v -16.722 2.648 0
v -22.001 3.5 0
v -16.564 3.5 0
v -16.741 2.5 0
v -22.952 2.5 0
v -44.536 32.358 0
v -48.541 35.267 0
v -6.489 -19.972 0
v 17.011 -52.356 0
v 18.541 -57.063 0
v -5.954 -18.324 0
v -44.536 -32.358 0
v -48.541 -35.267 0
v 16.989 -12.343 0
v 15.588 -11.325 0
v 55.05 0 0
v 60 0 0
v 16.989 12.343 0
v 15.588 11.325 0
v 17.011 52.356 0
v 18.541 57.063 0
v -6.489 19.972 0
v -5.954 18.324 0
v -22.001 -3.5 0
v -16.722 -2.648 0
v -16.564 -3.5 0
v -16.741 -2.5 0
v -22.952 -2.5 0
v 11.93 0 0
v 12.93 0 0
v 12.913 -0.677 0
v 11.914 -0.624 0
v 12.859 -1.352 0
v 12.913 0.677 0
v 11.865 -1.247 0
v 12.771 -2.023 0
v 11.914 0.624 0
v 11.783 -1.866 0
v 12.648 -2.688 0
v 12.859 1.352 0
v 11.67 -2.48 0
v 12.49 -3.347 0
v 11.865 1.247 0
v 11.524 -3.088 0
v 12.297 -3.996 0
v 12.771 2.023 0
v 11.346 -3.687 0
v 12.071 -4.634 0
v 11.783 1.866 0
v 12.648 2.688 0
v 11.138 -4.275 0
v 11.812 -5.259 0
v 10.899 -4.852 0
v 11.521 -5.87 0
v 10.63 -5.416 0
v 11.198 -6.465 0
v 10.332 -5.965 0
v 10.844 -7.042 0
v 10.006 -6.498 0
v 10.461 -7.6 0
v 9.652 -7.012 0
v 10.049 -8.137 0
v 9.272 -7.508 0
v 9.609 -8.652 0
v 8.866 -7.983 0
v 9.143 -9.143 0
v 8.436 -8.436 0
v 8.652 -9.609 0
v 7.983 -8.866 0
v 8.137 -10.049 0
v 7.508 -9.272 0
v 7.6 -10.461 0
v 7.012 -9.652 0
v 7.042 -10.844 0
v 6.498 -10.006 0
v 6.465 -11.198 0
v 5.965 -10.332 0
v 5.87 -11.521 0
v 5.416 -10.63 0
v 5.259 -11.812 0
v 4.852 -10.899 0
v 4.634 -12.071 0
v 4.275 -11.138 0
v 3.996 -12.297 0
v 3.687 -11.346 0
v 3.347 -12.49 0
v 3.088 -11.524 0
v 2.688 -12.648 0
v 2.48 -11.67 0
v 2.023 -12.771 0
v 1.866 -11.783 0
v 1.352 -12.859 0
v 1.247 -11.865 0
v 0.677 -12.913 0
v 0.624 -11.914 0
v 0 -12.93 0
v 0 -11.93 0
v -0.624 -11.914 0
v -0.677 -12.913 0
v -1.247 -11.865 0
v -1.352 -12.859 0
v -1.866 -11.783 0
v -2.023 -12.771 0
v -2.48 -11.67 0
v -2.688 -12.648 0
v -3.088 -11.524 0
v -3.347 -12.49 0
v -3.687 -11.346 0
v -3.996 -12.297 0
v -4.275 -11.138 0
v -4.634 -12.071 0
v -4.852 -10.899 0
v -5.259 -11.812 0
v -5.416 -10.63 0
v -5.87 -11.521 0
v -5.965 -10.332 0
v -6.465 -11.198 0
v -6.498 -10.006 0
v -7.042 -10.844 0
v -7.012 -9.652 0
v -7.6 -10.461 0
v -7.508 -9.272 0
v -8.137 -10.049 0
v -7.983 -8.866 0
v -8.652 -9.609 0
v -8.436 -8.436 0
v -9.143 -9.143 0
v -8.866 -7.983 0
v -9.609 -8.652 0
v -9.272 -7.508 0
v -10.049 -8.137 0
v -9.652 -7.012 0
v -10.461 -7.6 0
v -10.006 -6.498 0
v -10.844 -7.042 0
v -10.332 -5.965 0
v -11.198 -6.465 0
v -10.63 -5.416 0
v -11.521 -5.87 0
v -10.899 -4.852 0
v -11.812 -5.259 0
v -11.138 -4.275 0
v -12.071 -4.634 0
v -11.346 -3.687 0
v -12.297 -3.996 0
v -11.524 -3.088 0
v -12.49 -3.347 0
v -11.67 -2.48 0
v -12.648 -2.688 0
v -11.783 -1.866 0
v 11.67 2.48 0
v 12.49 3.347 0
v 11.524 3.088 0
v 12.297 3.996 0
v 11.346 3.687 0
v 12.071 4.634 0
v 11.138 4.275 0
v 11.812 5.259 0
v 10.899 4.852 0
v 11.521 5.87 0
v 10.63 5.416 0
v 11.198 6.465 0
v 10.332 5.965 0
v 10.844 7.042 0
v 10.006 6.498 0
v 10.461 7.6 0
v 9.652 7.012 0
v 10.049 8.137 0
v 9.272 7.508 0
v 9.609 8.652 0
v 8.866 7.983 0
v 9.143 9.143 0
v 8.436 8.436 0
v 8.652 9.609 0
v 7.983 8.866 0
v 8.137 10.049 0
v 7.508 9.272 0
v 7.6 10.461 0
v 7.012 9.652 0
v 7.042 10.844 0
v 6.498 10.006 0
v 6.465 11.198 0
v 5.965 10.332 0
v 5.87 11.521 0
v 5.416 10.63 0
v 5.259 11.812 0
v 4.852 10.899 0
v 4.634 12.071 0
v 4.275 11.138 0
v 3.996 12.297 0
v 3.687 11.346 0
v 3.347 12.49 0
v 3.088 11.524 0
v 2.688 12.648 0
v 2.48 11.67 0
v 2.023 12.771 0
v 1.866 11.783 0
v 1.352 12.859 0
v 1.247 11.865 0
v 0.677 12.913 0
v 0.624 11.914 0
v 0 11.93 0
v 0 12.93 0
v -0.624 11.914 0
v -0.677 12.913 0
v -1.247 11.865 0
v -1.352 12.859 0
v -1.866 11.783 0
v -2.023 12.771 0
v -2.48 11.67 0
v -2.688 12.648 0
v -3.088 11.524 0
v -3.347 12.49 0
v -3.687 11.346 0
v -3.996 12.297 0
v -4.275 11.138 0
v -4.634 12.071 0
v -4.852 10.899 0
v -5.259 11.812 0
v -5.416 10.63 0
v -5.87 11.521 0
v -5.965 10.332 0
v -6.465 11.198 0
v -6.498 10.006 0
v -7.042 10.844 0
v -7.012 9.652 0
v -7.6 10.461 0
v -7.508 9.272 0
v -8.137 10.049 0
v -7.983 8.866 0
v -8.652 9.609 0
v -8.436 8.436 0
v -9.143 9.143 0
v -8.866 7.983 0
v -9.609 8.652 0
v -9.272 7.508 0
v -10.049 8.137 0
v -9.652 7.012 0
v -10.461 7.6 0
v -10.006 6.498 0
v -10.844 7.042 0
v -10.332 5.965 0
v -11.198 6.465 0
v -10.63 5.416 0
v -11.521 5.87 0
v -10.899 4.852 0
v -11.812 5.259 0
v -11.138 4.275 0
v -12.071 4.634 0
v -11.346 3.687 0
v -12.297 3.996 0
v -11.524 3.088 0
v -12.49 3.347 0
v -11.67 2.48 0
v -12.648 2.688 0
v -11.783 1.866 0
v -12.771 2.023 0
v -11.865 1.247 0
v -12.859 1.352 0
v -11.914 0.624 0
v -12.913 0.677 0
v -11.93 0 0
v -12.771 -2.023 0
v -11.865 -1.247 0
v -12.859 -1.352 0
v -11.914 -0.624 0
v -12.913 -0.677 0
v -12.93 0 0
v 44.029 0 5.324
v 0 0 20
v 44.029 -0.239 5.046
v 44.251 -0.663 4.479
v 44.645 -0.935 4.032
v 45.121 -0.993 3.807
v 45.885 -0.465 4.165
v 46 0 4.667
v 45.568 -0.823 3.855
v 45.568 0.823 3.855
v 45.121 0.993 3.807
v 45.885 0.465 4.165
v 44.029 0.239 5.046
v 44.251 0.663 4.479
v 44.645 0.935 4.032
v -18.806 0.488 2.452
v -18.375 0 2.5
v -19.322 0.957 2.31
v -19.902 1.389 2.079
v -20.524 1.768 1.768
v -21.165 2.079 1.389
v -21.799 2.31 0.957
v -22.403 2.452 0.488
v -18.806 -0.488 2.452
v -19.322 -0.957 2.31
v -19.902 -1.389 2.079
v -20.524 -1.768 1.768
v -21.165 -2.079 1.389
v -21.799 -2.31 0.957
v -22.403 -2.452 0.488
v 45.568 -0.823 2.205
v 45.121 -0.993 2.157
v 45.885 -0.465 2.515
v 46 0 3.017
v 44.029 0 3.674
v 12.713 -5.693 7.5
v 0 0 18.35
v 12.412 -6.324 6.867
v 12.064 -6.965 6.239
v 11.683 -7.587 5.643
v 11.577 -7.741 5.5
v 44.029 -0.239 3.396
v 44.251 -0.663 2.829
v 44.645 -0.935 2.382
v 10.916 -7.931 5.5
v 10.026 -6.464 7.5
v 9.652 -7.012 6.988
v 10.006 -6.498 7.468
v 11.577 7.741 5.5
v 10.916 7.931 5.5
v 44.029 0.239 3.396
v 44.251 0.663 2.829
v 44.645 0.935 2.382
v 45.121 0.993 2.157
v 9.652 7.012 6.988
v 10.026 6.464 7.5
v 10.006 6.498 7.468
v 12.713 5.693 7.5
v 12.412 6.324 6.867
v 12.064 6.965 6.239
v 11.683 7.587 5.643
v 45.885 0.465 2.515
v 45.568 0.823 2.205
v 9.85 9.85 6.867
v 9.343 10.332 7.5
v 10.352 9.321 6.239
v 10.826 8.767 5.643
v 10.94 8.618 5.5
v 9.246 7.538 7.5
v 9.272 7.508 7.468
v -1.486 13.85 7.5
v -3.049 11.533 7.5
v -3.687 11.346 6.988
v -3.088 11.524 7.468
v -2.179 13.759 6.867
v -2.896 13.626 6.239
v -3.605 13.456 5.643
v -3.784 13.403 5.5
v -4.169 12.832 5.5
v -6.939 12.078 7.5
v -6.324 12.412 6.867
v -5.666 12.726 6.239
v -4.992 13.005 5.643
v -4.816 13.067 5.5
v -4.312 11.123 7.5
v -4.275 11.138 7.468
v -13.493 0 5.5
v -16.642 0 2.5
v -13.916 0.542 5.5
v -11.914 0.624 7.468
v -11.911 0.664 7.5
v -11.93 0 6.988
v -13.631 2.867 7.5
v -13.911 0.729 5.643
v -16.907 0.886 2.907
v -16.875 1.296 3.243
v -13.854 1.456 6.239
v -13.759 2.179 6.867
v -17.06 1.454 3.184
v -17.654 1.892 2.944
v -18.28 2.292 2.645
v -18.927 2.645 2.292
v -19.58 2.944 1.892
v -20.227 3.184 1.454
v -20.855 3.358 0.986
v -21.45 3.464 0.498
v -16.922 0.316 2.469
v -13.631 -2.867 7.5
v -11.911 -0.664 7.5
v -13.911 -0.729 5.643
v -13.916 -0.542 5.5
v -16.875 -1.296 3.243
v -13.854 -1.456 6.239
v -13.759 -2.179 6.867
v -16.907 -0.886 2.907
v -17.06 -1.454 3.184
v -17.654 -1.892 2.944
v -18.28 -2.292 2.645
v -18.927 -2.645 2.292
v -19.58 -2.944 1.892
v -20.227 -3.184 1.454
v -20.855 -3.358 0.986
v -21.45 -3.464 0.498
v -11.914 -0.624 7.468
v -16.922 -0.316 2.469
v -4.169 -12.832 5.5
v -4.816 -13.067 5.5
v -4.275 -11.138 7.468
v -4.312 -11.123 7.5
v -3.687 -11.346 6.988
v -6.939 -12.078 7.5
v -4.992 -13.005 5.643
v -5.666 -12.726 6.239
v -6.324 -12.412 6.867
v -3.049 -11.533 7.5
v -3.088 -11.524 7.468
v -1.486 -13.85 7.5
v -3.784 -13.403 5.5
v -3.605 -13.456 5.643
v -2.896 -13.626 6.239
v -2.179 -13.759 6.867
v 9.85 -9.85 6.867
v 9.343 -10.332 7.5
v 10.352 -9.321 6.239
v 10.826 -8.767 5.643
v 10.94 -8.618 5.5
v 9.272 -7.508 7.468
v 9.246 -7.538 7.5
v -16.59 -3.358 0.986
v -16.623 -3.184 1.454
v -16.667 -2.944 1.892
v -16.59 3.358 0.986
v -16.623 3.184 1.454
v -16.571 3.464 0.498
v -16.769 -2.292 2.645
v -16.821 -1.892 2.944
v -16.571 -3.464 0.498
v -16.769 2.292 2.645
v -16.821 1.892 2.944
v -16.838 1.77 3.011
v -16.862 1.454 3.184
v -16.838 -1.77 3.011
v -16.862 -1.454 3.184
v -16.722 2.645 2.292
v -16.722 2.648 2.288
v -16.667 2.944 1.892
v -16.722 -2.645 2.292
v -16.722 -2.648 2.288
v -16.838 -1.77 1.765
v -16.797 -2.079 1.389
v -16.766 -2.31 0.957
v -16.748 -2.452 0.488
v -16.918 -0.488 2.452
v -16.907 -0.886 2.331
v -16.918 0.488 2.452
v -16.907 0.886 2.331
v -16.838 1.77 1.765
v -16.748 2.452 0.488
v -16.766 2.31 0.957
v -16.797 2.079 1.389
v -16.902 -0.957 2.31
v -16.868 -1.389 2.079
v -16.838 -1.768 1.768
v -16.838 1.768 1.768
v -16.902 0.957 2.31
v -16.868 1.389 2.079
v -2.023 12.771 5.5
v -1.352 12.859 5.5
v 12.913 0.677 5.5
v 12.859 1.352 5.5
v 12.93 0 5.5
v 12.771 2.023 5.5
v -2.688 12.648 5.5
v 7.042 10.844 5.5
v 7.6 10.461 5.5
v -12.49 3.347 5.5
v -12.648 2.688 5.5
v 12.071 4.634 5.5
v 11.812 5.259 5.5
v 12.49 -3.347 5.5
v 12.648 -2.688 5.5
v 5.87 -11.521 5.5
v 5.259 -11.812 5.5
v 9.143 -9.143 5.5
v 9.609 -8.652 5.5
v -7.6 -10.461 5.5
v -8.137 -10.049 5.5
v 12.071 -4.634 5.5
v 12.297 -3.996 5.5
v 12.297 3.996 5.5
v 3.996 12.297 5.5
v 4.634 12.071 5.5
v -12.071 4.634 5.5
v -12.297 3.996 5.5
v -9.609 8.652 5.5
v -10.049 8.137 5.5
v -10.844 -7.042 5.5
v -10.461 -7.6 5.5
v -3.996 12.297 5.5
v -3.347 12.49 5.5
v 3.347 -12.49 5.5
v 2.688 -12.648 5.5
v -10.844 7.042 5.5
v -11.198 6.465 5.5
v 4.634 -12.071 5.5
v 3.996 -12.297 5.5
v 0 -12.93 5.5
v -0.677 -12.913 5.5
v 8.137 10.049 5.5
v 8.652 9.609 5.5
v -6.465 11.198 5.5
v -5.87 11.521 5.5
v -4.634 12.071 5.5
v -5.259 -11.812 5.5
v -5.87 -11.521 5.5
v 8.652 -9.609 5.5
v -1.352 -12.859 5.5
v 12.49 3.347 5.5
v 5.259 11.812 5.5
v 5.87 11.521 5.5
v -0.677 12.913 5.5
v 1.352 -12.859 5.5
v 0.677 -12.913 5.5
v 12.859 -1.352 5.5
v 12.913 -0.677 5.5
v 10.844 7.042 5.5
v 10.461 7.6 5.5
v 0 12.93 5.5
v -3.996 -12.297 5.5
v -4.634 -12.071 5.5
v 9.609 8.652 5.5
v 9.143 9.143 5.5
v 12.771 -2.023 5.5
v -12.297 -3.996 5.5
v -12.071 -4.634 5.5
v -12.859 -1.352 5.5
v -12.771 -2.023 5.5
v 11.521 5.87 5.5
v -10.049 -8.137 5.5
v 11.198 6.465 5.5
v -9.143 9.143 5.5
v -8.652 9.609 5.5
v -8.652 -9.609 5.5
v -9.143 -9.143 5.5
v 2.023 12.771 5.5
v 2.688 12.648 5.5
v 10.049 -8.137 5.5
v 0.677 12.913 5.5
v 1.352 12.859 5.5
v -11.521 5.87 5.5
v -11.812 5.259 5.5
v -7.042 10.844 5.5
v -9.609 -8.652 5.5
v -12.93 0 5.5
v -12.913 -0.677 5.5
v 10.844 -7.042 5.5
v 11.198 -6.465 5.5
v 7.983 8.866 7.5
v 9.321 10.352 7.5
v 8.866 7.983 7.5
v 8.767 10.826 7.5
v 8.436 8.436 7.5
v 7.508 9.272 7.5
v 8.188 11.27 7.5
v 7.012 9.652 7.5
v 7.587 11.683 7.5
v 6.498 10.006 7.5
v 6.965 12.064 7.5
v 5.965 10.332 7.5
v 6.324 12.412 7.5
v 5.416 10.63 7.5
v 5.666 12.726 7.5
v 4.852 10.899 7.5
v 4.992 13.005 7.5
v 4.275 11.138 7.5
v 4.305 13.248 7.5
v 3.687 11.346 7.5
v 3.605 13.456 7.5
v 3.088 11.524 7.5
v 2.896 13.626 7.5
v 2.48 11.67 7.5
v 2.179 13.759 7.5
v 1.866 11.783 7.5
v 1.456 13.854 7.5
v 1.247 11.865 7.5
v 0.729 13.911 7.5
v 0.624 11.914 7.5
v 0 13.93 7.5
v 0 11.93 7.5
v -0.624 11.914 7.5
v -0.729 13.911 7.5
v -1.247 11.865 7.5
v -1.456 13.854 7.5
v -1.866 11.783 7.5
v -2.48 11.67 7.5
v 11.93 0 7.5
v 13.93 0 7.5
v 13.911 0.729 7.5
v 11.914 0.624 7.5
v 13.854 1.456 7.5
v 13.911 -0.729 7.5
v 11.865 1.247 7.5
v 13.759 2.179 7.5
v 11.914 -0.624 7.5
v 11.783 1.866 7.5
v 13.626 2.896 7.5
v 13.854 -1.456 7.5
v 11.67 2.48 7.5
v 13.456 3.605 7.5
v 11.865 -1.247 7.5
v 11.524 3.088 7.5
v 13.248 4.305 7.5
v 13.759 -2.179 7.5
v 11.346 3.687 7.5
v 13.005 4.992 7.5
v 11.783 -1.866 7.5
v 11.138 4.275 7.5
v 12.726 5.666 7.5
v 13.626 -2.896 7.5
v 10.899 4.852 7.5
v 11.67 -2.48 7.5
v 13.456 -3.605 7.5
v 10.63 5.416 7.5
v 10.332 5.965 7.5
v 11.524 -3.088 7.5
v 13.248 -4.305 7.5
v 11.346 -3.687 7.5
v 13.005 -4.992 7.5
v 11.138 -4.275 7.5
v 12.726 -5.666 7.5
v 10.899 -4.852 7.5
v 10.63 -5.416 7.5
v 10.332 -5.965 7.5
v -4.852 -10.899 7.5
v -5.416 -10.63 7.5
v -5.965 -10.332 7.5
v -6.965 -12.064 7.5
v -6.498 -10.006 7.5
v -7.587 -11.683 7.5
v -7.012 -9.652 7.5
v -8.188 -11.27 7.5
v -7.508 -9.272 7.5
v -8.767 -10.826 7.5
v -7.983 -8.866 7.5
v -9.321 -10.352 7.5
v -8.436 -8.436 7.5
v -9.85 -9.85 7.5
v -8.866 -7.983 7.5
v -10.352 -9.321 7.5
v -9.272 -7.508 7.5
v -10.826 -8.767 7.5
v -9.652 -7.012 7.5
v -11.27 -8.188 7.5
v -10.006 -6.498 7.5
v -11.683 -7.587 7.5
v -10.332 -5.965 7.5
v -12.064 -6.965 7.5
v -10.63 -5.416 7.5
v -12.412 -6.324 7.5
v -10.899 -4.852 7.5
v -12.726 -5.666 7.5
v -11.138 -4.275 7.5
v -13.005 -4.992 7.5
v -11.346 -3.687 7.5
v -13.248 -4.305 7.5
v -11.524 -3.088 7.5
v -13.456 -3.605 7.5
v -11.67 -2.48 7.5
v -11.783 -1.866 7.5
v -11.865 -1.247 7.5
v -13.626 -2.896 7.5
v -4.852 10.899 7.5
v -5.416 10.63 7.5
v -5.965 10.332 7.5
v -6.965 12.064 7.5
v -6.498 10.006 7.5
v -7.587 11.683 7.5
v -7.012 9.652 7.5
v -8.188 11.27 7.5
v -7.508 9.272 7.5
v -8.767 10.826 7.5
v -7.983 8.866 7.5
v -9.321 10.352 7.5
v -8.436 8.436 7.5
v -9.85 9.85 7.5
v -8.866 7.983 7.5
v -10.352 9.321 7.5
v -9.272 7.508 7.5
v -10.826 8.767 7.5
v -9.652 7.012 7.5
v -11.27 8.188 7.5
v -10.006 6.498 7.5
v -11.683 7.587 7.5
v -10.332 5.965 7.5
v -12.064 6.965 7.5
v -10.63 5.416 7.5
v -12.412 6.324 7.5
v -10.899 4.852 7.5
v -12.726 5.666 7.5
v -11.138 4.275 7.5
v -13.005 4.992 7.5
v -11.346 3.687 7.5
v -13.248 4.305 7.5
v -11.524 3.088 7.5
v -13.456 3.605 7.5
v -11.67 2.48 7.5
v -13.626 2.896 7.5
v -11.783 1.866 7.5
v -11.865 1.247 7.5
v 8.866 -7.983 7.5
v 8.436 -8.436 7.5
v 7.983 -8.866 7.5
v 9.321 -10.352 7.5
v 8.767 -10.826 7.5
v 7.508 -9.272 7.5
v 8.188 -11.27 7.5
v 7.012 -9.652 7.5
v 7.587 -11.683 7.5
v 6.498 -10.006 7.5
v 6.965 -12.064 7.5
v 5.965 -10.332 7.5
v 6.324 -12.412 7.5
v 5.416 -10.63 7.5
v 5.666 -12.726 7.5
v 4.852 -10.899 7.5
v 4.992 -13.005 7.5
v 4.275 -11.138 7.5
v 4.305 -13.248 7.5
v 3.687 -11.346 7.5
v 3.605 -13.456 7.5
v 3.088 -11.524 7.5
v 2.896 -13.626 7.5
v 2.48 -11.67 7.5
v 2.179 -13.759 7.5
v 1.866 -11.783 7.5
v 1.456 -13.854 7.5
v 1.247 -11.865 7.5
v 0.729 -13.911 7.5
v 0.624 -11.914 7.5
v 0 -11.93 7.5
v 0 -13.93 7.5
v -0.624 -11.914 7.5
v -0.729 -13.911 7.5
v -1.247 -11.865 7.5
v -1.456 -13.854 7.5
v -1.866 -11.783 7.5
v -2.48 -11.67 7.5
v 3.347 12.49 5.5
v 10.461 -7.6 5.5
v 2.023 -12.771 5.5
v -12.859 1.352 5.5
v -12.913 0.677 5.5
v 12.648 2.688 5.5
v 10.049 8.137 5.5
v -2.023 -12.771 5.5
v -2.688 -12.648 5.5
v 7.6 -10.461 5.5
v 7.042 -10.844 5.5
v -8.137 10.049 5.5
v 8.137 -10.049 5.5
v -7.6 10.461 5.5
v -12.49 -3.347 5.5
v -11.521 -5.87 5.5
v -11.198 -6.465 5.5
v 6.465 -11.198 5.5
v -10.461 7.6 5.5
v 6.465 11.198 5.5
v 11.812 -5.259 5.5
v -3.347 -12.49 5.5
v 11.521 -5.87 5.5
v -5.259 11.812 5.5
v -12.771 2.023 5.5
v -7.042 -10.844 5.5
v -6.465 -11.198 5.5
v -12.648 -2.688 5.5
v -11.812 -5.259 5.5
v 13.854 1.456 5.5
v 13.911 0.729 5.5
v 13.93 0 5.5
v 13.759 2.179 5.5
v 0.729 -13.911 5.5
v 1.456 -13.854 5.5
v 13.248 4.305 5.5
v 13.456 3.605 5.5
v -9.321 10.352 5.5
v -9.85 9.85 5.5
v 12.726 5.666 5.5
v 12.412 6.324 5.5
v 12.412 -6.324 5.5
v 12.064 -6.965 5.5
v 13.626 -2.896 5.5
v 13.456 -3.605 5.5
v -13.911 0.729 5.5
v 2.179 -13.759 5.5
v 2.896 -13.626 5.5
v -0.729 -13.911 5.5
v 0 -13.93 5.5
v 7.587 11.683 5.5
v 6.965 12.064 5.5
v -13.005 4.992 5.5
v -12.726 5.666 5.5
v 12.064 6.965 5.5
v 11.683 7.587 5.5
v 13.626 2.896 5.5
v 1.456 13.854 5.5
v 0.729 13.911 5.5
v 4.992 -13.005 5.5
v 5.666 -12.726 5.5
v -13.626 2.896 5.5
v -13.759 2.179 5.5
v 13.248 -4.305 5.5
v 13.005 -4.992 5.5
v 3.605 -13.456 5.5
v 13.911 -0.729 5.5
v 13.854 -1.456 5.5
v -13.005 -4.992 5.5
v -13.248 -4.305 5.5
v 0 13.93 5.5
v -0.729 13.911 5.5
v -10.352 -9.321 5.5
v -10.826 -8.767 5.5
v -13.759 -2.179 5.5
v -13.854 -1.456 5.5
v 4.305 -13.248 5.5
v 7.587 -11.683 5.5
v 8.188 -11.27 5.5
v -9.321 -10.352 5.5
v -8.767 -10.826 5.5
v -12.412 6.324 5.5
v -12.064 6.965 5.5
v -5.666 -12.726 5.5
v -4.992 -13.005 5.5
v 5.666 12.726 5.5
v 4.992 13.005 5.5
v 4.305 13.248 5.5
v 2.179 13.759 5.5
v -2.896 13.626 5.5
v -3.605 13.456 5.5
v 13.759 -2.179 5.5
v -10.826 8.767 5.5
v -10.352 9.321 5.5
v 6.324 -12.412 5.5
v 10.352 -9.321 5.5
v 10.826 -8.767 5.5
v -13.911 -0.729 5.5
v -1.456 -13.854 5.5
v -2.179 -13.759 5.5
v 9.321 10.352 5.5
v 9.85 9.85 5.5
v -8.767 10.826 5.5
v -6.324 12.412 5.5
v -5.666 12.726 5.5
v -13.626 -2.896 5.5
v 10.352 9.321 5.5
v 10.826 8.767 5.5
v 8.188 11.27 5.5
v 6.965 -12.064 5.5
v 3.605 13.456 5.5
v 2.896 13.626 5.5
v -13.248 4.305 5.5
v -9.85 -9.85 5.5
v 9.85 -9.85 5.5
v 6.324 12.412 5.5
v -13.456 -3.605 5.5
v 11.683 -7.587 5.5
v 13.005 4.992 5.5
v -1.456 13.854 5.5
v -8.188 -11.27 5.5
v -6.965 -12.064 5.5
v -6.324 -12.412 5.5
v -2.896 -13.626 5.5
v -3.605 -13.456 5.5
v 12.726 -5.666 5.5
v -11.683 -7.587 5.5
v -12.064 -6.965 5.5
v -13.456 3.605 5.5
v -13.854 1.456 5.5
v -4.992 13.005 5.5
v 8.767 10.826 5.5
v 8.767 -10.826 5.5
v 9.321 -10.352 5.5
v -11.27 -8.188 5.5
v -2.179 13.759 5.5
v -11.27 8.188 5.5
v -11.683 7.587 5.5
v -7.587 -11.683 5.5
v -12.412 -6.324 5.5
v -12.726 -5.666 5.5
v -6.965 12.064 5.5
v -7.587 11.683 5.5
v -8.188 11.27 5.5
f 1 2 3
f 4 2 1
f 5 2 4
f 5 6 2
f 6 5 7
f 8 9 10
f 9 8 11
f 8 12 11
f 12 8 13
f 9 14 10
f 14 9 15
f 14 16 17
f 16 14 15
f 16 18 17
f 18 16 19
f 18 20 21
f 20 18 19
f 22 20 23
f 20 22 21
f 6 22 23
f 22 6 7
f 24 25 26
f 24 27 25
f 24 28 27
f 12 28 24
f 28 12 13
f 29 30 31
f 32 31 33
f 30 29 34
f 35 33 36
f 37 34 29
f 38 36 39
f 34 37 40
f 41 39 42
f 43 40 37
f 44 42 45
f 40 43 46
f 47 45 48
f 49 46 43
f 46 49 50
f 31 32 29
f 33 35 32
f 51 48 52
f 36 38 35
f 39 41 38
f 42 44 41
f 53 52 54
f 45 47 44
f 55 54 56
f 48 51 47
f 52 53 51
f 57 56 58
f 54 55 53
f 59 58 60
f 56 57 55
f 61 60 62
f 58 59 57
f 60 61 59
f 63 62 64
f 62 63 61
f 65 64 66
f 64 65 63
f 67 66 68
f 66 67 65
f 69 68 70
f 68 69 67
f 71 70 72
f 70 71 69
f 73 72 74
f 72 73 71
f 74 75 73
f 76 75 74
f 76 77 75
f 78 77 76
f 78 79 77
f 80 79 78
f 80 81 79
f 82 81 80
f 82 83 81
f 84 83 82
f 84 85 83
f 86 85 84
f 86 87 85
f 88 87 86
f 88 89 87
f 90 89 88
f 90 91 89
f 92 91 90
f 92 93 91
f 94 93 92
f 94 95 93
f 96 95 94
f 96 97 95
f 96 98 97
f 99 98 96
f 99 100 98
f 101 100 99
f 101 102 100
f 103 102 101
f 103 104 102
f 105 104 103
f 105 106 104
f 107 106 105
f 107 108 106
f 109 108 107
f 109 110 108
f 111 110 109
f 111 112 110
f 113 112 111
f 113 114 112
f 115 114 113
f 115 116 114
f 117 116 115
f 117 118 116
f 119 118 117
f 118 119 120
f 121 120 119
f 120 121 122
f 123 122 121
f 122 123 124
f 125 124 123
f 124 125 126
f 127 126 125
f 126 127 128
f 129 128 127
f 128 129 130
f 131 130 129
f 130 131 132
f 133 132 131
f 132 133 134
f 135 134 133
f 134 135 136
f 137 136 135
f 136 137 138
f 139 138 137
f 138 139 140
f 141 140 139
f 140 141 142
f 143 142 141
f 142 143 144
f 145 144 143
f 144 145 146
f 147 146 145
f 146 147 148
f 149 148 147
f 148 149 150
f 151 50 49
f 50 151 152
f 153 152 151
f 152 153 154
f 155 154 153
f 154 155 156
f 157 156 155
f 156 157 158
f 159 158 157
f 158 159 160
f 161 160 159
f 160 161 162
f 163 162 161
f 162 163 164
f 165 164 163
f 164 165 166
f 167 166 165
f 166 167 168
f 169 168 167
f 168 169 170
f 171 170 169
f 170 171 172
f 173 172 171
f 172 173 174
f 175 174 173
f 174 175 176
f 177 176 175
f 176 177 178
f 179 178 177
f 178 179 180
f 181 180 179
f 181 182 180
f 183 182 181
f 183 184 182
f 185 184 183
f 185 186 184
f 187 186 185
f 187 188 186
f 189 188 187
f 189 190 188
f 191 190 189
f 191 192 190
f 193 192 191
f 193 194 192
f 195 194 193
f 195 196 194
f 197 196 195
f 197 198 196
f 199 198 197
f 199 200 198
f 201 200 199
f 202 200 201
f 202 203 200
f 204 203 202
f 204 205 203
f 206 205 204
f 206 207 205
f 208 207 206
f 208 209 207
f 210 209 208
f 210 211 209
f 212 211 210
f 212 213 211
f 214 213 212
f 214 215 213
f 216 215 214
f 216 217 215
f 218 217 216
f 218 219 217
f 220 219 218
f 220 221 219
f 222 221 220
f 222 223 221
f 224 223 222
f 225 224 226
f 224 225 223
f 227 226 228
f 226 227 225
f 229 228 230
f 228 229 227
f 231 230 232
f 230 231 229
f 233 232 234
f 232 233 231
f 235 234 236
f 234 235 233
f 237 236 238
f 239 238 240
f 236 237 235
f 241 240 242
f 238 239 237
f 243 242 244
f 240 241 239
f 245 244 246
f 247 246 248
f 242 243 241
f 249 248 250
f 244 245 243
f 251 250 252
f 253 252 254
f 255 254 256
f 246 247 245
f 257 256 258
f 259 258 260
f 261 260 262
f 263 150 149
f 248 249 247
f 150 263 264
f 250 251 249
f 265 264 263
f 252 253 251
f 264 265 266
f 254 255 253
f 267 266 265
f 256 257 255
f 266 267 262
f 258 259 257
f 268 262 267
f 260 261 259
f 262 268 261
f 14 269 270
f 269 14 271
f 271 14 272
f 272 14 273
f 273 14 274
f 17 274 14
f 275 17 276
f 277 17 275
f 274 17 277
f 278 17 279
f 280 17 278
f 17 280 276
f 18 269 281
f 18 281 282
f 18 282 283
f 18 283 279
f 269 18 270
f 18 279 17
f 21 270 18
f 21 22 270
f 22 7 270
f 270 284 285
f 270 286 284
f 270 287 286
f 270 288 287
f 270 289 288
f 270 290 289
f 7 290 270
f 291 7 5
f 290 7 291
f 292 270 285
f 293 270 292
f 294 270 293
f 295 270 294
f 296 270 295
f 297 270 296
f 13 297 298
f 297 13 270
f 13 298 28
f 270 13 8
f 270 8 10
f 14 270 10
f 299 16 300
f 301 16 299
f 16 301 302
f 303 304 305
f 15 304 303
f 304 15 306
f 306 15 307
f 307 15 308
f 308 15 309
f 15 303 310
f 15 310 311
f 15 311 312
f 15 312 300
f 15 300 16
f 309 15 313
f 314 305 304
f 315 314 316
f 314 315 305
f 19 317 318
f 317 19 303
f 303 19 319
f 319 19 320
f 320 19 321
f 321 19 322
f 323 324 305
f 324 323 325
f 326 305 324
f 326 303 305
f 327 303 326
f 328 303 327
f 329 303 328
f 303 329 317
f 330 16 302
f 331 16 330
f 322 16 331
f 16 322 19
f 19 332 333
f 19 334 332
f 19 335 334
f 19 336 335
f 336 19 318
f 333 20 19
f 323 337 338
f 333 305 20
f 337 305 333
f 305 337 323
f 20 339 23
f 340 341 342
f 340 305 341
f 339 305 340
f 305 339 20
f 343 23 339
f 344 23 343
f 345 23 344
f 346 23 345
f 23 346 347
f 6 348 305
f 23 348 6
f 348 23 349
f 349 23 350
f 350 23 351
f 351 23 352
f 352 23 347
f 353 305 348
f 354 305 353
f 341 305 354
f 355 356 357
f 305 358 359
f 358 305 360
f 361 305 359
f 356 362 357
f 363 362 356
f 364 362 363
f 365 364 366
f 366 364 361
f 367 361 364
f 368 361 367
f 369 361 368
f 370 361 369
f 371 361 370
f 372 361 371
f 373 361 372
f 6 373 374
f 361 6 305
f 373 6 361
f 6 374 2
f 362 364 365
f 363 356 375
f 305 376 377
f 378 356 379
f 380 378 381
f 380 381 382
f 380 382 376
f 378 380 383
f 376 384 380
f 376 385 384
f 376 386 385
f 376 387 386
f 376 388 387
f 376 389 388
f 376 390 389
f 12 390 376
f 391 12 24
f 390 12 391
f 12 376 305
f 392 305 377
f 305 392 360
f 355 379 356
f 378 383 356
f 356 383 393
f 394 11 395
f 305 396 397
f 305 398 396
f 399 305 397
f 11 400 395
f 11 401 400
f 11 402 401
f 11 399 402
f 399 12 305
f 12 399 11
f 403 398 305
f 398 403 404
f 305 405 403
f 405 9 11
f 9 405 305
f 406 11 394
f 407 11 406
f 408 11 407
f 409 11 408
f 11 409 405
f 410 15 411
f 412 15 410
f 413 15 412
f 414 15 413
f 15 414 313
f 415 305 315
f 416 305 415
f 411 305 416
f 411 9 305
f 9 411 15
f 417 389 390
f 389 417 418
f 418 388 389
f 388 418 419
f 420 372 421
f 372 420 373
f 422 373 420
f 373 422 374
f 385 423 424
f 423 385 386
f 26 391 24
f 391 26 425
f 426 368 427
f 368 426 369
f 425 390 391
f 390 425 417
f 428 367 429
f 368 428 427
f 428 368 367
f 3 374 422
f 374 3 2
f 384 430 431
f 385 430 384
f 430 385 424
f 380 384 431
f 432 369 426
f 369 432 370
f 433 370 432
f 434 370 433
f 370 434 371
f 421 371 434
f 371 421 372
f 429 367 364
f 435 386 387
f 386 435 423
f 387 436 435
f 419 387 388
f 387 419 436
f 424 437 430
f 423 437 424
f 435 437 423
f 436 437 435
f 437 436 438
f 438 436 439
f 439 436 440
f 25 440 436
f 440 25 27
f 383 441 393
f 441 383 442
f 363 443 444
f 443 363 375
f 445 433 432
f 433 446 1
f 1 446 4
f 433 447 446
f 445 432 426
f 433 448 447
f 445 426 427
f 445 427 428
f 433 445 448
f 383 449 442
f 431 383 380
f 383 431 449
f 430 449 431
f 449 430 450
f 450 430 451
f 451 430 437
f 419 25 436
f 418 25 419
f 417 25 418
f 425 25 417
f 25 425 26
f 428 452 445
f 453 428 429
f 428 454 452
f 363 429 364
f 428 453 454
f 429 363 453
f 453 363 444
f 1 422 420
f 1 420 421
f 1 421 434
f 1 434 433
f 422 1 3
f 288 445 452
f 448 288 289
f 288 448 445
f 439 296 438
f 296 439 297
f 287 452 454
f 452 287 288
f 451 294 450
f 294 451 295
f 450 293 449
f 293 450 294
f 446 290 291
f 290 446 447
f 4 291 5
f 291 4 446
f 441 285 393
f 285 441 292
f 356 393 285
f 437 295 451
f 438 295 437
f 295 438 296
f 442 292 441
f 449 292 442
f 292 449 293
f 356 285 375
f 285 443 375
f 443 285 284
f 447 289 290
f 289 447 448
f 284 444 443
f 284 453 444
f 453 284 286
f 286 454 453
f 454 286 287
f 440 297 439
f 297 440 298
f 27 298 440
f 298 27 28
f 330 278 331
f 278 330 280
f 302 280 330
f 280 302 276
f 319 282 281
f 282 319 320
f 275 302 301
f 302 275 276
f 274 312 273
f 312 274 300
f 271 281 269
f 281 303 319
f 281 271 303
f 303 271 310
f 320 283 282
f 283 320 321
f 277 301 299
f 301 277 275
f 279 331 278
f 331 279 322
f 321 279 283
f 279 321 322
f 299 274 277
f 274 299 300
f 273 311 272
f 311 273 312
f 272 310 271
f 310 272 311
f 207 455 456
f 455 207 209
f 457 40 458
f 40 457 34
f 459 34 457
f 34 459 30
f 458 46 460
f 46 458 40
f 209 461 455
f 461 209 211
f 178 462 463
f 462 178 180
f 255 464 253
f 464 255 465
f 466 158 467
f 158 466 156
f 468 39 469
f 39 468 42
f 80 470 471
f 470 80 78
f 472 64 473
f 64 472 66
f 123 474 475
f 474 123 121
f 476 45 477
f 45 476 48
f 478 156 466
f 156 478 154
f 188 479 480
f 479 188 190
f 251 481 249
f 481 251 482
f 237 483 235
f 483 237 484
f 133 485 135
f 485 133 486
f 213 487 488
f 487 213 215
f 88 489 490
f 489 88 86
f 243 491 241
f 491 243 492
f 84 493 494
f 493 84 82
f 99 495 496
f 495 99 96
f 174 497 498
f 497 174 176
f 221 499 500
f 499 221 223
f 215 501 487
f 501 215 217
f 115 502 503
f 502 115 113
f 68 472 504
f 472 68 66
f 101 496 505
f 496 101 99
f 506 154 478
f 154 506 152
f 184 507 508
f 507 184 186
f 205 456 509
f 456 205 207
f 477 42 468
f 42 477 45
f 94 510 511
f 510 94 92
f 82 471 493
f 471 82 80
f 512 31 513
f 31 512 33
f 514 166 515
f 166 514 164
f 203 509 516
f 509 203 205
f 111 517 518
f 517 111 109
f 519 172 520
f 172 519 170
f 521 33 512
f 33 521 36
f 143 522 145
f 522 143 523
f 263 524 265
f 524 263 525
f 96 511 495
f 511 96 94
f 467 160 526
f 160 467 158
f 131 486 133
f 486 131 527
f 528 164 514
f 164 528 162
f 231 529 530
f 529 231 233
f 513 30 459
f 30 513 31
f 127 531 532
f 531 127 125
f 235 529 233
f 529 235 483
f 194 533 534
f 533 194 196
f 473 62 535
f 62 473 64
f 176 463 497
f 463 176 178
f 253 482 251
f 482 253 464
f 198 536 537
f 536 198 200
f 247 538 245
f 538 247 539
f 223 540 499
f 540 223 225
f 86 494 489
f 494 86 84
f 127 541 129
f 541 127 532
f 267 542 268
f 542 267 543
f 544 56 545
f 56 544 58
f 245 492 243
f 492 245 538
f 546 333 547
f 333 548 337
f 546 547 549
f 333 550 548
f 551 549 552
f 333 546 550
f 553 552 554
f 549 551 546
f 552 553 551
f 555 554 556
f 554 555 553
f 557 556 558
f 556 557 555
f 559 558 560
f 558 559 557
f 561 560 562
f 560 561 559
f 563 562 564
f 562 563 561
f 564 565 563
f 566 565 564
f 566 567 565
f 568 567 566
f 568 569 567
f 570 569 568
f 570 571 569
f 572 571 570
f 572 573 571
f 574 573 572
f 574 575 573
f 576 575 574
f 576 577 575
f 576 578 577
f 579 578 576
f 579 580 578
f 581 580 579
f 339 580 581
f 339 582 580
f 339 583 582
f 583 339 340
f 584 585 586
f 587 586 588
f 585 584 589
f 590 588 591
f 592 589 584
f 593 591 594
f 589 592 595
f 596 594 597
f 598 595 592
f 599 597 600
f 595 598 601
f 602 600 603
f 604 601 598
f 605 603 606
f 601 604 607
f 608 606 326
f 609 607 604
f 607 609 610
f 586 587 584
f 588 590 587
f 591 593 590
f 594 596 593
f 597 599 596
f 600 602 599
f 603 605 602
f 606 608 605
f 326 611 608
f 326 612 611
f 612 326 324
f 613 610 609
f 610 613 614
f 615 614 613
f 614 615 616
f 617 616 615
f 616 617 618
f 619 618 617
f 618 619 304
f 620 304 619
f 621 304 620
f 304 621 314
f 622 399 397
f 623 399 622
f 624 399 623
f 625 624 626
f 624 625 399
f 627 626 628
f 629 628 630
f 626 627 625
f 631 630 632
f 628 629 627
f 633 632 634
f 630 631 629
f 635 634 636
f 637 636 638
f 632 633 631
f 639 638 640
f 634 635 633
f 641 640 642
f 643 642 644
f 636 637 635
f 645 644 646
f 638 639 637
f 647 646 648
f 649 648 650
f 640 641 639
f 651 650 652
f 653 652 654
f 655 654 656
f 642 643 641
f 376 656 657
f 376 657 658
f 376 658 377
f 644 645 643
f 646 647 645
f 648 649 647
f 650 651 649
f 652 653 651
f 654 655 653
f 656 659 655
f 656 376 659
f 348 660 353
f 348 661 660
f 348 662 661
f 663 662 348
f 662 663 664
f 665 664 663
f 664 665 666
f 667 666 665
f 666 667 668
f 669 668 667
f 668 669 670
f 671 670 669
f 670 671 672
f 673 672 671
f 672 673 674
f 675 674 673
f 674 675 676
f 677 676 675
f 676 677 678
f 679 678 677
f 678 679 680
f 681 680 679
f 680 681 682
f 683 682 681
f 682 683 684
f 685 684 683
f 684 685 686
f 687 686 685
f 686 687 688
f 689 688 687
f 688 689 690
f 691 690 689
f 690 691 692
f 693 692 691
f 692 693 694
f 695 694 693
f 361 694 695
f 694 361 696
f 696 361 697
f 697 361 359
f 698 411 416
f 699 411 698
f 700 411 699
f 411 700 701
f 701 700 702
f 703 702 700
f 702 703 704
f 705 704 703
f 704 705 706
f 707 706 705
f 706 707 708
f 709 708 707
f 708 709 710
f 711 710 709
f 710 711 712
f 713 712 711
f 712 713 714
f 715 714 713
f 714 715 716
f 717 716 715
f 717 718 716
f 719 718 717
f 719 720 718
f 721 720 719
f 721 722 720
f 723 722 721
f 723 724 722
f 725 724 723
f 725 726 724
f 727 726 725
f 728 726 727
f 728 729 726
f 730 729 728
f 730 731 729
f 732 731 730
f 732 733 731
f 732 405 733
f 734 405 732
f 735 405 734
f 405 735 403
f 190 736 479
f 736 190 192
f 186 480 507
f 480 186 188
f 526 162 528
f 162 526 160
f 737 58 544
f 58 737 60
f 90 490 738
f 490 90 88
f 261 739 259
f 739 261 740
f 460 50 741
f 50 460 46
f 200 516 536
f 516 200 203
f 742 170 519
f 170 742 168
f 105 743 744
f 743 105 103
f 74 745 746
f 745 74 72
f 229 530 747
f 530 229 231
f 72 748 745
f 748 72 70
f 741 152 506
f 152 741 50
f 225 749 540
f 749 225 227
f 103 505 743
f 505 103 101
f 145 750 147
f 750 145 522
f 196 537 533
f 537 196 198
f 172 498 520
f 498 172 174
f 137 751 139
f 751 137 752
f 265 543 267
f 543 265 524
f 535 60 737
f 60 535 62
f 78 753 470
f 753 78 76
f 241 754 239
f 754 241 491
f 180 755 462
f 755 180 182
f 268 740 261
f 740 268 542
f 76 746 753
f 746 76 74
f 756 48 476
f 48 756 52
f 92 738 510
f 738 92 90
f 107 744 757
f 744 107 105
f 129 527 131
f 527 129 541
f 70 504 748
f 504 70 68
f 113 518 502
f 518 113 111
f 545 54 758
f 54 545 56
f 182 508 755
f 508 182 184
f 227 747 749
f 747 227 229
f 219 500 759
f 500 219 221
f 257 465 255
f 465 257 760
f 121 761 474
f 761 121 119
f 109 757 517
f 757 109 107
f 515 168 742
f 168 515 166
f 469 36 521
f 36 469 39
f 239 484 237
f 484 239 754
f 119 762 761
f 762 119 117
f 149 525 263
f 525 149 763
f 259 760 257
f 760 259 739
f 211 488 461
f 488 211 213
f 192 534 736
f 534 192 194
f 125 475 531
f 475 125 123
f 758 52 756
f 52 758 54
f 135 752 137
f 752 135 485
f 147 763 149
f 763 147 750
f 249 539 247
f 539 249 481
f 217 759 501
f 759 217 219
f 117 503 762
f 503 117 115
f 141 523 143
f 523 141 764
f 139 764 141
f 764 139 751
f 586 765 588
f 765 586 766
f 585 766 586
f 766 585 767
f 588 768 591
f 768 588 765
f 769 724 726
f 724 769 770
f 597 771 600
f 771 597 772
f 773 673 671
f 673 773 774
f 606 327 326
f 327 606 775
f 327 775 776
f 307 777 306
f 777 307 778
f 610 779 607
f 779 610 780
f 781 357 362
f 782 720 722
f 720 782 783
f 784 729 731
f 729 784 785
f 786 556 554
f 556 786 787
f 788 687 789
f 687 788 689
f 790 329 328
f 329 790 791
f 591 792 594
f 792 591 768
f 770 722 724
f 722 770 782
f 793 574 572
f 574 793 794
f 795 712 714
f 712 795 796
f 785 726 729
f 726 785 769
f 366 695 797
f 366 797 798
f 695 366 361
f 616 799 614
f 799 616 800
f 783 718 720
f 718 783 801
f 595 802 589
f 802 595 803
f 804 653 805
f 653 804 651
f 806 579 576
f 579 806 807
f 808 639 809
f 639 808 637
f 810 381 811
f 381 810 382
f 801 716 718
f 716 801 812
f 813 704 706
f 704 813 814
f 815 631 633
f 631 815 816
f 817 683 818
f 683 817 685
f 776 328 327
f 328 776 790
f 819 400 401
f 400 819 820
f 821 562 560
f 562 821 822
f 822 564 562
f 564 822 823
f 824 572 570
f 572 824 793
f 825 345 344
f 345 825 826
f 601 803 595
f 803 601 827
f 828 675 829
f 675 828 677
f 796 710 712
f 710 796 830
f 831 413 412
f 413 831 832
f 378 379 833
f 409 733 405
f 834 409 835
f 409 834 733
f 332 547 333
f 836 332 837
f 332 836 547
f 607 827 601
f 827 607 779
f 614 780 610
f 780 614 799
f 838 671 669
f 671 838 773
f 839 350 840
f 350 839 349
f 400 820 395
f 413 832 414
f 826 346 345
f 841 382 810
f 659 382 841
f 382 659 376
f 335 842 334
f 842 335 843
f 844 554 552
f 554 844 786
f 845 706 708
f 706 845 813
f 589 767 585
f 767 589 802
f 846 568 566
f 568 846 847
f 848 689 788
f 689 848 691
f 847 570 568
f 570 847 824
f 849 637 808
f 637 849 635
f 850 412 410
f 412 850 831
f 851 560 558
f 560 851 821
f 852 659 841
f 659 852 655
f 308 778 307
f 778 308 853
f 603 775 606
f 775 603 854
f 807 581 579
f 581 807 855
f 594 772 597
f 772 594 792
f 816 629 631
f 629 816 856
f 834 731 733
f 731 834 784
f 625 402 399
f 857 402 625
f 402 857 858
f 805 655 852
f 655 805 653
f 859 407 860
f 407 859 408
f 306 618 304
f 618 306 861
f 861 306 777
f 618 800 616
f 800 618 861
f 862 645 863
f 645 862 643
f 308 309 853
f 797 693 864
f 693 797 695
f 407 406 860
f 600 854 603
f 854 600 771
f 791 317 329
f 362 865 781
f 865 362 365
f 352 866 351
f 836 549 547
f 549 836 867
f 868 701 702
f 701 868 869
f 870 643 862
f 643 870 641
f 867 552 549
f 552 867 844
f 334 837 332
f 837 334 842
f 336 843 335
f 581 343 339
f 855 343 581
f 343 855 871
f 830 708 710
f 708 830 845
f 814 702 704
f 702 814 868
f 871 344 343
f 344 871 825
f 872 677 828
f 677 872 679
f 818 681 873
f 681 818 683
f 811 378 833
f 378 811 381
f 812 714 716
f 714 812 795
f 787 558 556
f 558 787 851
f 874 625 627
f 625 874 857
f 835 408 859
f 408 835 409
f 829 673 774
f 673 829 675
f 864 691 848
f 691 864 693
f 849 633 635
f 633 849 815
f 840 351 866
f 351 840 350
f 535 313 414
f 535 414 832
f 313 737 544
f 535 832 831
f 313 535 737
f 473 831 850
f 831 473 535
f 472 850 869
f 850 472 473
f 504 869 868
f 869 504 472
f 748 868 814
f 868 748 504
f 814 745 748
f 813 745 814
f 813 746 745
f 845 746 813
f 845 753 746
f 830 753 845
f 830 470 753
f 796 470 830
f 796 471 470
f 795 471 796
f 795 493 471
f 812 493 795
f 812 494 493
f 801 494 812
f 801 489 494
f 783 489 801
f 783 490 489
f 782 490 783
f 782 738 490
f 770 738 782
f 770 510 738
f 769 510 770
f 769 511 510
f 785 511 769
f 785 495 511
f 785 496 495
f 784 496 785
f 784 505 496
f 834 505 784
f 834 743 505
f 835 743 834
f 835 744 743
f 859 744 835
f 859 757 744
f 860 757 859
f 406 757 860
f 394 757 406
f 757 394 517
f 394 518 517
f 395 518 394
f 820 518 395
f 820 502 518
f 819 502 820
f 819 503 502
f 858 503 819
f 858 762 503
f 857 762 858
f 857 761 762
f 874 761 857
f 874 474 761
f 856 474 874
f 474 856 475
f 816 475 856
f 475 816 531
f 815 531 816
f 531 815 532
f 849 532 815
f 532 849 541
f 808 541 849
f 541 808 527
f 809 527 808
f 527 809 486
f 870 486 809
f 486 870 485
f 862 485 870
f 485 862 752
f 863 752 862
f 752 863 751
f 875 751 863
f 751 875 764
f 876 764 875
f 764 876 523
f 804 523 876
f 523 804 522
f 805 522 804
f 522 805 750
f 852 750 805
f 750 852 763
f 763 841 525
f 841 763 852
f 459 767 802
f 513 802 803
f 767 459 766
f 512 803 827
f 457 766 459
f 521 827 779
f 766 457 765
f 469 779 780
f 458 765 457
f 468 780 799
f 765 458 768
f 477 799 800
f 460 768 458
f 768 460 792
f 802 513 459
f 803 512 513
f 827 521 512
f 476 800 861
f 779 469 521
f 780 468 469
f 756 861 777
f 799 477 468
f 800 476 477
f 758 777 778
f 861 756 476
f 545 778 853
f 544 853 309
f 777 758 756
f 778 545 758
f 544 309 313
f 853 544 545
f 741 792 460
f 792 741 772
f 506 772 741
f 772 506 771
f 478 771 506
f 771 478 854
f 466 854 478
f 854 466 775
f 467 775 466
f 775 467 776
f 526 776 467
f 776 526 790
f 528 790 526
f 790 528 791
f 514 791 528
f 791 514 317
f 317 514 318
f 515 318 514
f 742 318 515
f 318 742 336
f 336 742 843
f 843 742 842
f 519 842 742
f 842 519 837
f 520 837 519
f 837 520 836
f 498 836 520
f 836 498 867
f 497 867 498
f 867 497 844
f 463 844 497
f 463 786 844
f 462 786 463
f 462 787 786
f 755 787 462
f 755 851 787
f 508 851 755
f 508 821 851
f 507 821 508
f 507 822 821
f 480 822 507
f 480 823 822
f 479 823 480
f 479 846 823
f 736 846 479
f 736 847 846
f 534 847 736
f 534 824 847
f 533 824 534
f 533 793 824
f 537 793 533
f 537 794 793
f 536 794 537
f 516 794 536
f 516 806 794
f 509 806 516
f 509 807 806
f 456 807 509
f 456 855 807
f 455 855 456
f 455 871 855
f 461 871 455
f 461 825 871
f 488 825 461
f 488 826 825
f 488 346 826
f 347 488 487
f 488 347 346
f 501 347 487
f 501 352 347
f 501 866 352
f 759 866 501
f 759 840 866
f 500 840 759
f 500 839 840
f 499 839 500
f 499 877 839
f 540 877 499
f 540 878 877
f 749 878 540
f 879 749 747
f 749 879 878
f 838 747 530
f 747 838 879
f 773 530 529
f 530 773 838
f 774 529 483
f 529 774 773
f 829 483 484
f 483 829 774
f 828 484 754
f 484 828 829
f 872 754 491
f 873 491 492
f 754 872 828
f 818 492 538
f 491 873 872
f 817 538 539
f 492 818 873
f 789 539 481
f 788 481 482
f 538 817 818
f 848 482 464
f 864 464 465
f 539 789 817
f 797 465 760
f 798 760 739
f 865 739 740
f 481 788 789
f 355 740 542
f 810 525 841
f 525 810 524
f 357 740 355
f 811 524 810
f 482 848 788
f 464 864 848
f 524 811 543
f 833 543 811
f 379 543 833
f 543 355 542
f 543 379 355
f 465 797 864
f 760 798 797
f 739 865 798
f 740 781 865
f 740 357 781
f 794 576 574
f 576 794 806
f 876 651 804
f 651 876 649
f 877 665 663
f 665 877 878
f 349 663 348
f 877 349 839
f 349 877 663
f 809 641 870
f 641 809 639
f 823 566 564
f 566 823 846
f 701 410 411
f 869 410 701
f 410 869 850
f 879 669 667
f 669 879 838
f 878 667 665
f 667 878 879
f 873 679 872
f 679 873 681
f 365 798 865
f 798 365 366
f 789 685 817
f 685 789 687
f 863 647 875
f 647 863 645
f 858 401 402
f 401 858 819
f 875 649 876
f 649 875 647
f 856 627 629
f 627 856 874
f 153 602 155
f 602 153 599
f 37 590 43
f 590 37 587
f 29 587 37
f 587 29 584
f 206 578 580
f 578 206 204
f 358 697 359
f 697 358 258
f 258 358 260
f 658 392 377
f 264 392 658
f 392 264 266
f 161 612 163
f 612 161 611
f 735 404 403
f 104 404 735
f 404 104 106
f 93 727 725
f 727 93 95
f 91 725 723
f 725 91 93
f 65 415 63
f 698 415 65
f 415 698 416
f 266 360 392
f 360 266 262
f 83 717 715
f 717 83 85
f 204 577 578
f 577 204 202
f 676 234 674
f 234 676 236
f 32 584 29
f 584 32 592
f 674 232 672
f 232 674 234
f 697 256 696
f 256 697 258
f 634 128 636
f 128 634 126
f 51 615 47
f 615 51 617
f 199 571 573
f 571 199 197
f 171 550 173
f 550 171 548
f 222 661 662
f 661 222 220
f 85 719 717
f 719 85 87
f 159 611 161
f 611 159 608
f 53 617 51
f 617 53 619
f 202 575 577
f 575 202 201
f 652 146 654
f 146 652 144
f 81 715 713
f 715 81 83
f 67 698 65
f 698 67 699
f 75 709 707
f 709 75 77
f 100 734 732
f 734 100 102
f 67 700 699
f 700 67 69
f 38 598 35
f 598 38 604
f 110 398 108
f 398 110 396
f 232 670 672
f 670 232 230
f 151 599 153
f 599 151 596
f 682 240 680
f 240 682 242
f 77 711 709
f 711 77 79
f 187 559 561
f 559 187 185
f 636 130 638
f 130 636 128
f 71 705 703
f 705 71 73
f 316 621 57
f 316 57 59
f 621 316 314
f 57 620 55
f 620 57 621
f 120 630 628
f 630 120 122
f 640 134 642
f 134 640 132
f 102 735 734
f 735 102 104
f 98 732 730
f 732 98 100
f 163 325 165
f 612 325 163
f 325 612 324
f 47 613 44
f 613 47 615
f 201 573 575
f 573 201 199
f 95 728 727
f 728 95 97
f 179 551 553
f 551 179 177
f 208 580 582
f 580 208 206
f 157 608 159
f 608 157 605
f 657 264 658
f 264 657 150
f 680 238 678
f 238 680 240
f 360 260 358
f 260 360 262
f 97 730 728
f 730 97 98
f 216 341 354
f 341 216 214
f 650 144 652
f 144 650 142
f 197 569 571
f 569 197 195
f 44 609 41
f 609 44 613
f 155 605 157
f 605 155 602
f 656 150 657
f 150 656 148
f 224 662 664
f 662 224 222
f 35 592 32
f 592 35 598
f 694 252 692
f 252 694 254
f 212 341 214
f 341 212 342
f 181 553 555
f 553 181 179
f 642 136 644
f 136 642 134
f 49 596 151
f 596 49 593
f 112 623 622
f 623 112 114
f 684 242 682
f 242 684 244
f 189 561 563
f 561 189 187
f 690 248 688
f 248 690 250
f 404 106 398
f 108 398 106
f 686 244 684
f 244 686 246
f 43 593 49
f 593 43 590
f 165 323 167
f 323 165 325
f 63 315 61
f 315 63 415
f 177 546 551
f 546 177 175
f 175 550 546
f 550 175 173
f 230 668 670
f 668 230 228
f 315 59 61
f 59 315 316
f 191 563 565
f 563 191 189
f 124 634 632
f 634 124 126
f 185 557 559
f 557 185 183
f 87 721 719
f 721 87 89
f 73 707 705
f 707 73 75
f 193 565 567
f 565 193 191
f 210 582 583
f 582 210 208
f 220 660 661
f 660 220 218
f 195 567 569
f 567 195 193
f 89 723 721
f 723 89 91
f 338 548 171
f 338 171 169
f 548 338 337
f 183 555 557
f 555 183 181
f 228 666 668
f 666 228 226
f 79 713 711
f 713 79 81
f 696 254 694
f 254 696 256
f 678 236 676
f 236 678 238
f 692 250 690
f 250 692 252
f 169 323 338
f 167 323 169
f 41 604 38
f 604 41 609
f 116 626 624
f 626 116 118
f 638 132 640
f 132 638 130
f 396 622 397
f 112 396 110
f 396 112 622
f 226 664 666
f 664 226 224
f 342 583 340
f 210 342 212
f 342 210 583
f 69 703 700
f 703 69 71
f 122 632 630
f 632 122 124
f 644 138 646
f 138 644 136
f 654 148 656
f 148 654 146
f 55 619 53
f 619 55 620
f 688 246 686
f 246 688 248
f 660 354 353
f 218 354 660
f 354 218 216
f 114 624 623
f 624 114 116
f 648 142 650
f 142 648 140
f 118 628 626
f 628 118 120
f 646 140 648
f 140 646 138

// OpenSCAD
/**
 * Decorative star containing a LED strip.
 * Print the star container twice (print1 mode)
 * and print the blocker once (print2 mode)
 */

// Part to print
part = "print1"; // [print1:Half star, print2: Binder]

// Number of branches of the star
branches = 5; // [3:50]
// Internal radius of the star
int_radius = 21; // [1:500]
// External radius of the star
ext_radius = 60; // [1:500]
// Height of the half star
height = 20; // [1:500]
// Width of the star container
width = 2; // [1:10]
// Diameter of the cable space
cable_diam = 5; // [1:20]
// Diameter of the holding wire
wire_diam = 2; // [1:10]

/* [Hidden] */


// Display mode
mode = part; // ["all": Full star preview, "view": Inside preview, part:print the selected part]

// Resolution
$fa = 3; // Minimum angle
$fs = 0.5; // Maximum fragment size

/**
 * Draw one star branch
 */
module branch(branches, int_radius, ext_radius, height) {
	origin = [-int_radius/2, 0, 0];
	top = [0, 0, height];
	summit = [ext_radius, 0, 0];
	angle = 360 / branches / 2;
	int1 = [int_radius * cos(angle), int_radius * sin(angle), 0];
	int2 = [int_radius * cos(angle), -int_radius * sin(angle), 0];
	points = [origin, int1, int2, summit, top];
	faces = [[0, 2, 3], [0, 3, 1], [4, 3, 2], [4, 1, 3], [4, 2, 0], [4, 0, 1]];
	polyhedron(points = points, triangles = faces);
}

/**
 * Draw a full star
 */
module star(branches, int_radius, ext_radius, height) {
	for (i = [0:branches-1]) {
		rotate([0, 0, i * 360 / branches]) {
			branch(branches, int_radius, ext_radius, height);
		}
	}
}

/**
 * Draw an empty star
 */
module empty_star(branches, int_radius, ext_radius, height, width) {
	difference() {
		star(branches, int_radius, ext_radius, height);
		translate([0, 0, -width*0.825])
			star(branches, int_radius, ext_radius, height);
	}
}

/**
 * Size computation for the LED strip
 */
function strip_height() = 10;
function strip_diam(leds) = (16.7 - 0.2) * leds / PI;
function strip_diam_in(leds) = strip_diam(leds) - 0.4;
function strip_diam_sup(leds) = strip_diam_in(leds);

/**
 * Draw a real-size model of the LED strip
 */
module led_strip(leds) {
	translate([0, 0, -5]) {
		difference() {
			cylinder(h = strip_height(), r = strip_diam(leds) / 2);
			translate([0, 0, -1])
				cylinder(h = strip_height() + 2, r = strip_diam_in(leds) / 2);
		}
	}
	for (i = [0:leds-1]) {
		rotate([0, 0, i * 360 / leds]) {
			translate([strip_diam(leds)/2, -2.5, -2.5])
				cube([2, 5, 5]);
		}
	}
}

/**
 * Star containing a LED strip
 */
module led_star() {
	difference() {
		// Base star
		union() {
			empty_star(branches, int_radius, ext_radius, height, width);
			difference() {
				intersection() {
					star(branches, int_radius, ext_radius, height, width);
					translate([-ext_radius, 0, 0])
						rotate([0, 90, 0])
							cylinder(r = (cable_diam+width)/2, h = ext_radius);
				}
				translate([0, 0, -1])
					cylinder(h = support_height+2, r = (strip_diam_sup(branches) + 4*width)/2);
			}
		}
		// Cable space
		translate([-ext_radius, 0, 0])
			rotate([0, 90, 0])
				cylinder(r = cable_diam/2, h = ext_radius);
		// Holder wire space
		translate([0.75*ext_radius, 0, 0])
			cylinder(h = height, r = wire_diam/2);
	}
	// LED strip support
	support_strip_height = strip_height() / 2 + 0.5;
	support_height = support_strip_height + 2;
	intersection() {
		star(branches, int_radius, ext_radius, height, width);
		difference() {
			union() {
				cylinder(h = support_height, r = strip_diam_sup(branches)/2);
				translate([0, 0, support_strip_height])
					cylinder(h = support_height - support_strip_height, r = (strip_diam_sup(branches) + width)/2);
			}
			translate([0, 0, -1])
				cylinder(h = height+1, r = (strip_diam_sup(branches)-width)/2);
		}
	}
}

/**
 * Blocker to hold both star halves
 */
module star_blocker(shift) {
	blocker_height = 7;
	translate([0, 0, shift ? -blocker_height : 0]) {
		difference() {
			cylinder(r = (strip_diam_sup(branches)-width-0.5)/2, h = blocker_height * 2);
			translate([0, 0, -1])
				cylinder(r = (strip_diam_sup(branches)-2*width-0.5)/2, h = blocker_height * 2 + 2);
		}
	}
}

// Half of the LED container
if (mode == "all" || mode == "view" || mode == "print1")
	led_star();
// Second half of the LED container
if (mode == "all")
	rotate([180, 0, 0])
		led_star();
// Blocker of the container
if (mode == "all" || mode == "view" || mode == "print2")
	color("red")
		star_blocker(mode != "print2");
// Model of the LED strip
if (mode == "all" || mode == "view")
	color("blue")
		led_strip(branches);
